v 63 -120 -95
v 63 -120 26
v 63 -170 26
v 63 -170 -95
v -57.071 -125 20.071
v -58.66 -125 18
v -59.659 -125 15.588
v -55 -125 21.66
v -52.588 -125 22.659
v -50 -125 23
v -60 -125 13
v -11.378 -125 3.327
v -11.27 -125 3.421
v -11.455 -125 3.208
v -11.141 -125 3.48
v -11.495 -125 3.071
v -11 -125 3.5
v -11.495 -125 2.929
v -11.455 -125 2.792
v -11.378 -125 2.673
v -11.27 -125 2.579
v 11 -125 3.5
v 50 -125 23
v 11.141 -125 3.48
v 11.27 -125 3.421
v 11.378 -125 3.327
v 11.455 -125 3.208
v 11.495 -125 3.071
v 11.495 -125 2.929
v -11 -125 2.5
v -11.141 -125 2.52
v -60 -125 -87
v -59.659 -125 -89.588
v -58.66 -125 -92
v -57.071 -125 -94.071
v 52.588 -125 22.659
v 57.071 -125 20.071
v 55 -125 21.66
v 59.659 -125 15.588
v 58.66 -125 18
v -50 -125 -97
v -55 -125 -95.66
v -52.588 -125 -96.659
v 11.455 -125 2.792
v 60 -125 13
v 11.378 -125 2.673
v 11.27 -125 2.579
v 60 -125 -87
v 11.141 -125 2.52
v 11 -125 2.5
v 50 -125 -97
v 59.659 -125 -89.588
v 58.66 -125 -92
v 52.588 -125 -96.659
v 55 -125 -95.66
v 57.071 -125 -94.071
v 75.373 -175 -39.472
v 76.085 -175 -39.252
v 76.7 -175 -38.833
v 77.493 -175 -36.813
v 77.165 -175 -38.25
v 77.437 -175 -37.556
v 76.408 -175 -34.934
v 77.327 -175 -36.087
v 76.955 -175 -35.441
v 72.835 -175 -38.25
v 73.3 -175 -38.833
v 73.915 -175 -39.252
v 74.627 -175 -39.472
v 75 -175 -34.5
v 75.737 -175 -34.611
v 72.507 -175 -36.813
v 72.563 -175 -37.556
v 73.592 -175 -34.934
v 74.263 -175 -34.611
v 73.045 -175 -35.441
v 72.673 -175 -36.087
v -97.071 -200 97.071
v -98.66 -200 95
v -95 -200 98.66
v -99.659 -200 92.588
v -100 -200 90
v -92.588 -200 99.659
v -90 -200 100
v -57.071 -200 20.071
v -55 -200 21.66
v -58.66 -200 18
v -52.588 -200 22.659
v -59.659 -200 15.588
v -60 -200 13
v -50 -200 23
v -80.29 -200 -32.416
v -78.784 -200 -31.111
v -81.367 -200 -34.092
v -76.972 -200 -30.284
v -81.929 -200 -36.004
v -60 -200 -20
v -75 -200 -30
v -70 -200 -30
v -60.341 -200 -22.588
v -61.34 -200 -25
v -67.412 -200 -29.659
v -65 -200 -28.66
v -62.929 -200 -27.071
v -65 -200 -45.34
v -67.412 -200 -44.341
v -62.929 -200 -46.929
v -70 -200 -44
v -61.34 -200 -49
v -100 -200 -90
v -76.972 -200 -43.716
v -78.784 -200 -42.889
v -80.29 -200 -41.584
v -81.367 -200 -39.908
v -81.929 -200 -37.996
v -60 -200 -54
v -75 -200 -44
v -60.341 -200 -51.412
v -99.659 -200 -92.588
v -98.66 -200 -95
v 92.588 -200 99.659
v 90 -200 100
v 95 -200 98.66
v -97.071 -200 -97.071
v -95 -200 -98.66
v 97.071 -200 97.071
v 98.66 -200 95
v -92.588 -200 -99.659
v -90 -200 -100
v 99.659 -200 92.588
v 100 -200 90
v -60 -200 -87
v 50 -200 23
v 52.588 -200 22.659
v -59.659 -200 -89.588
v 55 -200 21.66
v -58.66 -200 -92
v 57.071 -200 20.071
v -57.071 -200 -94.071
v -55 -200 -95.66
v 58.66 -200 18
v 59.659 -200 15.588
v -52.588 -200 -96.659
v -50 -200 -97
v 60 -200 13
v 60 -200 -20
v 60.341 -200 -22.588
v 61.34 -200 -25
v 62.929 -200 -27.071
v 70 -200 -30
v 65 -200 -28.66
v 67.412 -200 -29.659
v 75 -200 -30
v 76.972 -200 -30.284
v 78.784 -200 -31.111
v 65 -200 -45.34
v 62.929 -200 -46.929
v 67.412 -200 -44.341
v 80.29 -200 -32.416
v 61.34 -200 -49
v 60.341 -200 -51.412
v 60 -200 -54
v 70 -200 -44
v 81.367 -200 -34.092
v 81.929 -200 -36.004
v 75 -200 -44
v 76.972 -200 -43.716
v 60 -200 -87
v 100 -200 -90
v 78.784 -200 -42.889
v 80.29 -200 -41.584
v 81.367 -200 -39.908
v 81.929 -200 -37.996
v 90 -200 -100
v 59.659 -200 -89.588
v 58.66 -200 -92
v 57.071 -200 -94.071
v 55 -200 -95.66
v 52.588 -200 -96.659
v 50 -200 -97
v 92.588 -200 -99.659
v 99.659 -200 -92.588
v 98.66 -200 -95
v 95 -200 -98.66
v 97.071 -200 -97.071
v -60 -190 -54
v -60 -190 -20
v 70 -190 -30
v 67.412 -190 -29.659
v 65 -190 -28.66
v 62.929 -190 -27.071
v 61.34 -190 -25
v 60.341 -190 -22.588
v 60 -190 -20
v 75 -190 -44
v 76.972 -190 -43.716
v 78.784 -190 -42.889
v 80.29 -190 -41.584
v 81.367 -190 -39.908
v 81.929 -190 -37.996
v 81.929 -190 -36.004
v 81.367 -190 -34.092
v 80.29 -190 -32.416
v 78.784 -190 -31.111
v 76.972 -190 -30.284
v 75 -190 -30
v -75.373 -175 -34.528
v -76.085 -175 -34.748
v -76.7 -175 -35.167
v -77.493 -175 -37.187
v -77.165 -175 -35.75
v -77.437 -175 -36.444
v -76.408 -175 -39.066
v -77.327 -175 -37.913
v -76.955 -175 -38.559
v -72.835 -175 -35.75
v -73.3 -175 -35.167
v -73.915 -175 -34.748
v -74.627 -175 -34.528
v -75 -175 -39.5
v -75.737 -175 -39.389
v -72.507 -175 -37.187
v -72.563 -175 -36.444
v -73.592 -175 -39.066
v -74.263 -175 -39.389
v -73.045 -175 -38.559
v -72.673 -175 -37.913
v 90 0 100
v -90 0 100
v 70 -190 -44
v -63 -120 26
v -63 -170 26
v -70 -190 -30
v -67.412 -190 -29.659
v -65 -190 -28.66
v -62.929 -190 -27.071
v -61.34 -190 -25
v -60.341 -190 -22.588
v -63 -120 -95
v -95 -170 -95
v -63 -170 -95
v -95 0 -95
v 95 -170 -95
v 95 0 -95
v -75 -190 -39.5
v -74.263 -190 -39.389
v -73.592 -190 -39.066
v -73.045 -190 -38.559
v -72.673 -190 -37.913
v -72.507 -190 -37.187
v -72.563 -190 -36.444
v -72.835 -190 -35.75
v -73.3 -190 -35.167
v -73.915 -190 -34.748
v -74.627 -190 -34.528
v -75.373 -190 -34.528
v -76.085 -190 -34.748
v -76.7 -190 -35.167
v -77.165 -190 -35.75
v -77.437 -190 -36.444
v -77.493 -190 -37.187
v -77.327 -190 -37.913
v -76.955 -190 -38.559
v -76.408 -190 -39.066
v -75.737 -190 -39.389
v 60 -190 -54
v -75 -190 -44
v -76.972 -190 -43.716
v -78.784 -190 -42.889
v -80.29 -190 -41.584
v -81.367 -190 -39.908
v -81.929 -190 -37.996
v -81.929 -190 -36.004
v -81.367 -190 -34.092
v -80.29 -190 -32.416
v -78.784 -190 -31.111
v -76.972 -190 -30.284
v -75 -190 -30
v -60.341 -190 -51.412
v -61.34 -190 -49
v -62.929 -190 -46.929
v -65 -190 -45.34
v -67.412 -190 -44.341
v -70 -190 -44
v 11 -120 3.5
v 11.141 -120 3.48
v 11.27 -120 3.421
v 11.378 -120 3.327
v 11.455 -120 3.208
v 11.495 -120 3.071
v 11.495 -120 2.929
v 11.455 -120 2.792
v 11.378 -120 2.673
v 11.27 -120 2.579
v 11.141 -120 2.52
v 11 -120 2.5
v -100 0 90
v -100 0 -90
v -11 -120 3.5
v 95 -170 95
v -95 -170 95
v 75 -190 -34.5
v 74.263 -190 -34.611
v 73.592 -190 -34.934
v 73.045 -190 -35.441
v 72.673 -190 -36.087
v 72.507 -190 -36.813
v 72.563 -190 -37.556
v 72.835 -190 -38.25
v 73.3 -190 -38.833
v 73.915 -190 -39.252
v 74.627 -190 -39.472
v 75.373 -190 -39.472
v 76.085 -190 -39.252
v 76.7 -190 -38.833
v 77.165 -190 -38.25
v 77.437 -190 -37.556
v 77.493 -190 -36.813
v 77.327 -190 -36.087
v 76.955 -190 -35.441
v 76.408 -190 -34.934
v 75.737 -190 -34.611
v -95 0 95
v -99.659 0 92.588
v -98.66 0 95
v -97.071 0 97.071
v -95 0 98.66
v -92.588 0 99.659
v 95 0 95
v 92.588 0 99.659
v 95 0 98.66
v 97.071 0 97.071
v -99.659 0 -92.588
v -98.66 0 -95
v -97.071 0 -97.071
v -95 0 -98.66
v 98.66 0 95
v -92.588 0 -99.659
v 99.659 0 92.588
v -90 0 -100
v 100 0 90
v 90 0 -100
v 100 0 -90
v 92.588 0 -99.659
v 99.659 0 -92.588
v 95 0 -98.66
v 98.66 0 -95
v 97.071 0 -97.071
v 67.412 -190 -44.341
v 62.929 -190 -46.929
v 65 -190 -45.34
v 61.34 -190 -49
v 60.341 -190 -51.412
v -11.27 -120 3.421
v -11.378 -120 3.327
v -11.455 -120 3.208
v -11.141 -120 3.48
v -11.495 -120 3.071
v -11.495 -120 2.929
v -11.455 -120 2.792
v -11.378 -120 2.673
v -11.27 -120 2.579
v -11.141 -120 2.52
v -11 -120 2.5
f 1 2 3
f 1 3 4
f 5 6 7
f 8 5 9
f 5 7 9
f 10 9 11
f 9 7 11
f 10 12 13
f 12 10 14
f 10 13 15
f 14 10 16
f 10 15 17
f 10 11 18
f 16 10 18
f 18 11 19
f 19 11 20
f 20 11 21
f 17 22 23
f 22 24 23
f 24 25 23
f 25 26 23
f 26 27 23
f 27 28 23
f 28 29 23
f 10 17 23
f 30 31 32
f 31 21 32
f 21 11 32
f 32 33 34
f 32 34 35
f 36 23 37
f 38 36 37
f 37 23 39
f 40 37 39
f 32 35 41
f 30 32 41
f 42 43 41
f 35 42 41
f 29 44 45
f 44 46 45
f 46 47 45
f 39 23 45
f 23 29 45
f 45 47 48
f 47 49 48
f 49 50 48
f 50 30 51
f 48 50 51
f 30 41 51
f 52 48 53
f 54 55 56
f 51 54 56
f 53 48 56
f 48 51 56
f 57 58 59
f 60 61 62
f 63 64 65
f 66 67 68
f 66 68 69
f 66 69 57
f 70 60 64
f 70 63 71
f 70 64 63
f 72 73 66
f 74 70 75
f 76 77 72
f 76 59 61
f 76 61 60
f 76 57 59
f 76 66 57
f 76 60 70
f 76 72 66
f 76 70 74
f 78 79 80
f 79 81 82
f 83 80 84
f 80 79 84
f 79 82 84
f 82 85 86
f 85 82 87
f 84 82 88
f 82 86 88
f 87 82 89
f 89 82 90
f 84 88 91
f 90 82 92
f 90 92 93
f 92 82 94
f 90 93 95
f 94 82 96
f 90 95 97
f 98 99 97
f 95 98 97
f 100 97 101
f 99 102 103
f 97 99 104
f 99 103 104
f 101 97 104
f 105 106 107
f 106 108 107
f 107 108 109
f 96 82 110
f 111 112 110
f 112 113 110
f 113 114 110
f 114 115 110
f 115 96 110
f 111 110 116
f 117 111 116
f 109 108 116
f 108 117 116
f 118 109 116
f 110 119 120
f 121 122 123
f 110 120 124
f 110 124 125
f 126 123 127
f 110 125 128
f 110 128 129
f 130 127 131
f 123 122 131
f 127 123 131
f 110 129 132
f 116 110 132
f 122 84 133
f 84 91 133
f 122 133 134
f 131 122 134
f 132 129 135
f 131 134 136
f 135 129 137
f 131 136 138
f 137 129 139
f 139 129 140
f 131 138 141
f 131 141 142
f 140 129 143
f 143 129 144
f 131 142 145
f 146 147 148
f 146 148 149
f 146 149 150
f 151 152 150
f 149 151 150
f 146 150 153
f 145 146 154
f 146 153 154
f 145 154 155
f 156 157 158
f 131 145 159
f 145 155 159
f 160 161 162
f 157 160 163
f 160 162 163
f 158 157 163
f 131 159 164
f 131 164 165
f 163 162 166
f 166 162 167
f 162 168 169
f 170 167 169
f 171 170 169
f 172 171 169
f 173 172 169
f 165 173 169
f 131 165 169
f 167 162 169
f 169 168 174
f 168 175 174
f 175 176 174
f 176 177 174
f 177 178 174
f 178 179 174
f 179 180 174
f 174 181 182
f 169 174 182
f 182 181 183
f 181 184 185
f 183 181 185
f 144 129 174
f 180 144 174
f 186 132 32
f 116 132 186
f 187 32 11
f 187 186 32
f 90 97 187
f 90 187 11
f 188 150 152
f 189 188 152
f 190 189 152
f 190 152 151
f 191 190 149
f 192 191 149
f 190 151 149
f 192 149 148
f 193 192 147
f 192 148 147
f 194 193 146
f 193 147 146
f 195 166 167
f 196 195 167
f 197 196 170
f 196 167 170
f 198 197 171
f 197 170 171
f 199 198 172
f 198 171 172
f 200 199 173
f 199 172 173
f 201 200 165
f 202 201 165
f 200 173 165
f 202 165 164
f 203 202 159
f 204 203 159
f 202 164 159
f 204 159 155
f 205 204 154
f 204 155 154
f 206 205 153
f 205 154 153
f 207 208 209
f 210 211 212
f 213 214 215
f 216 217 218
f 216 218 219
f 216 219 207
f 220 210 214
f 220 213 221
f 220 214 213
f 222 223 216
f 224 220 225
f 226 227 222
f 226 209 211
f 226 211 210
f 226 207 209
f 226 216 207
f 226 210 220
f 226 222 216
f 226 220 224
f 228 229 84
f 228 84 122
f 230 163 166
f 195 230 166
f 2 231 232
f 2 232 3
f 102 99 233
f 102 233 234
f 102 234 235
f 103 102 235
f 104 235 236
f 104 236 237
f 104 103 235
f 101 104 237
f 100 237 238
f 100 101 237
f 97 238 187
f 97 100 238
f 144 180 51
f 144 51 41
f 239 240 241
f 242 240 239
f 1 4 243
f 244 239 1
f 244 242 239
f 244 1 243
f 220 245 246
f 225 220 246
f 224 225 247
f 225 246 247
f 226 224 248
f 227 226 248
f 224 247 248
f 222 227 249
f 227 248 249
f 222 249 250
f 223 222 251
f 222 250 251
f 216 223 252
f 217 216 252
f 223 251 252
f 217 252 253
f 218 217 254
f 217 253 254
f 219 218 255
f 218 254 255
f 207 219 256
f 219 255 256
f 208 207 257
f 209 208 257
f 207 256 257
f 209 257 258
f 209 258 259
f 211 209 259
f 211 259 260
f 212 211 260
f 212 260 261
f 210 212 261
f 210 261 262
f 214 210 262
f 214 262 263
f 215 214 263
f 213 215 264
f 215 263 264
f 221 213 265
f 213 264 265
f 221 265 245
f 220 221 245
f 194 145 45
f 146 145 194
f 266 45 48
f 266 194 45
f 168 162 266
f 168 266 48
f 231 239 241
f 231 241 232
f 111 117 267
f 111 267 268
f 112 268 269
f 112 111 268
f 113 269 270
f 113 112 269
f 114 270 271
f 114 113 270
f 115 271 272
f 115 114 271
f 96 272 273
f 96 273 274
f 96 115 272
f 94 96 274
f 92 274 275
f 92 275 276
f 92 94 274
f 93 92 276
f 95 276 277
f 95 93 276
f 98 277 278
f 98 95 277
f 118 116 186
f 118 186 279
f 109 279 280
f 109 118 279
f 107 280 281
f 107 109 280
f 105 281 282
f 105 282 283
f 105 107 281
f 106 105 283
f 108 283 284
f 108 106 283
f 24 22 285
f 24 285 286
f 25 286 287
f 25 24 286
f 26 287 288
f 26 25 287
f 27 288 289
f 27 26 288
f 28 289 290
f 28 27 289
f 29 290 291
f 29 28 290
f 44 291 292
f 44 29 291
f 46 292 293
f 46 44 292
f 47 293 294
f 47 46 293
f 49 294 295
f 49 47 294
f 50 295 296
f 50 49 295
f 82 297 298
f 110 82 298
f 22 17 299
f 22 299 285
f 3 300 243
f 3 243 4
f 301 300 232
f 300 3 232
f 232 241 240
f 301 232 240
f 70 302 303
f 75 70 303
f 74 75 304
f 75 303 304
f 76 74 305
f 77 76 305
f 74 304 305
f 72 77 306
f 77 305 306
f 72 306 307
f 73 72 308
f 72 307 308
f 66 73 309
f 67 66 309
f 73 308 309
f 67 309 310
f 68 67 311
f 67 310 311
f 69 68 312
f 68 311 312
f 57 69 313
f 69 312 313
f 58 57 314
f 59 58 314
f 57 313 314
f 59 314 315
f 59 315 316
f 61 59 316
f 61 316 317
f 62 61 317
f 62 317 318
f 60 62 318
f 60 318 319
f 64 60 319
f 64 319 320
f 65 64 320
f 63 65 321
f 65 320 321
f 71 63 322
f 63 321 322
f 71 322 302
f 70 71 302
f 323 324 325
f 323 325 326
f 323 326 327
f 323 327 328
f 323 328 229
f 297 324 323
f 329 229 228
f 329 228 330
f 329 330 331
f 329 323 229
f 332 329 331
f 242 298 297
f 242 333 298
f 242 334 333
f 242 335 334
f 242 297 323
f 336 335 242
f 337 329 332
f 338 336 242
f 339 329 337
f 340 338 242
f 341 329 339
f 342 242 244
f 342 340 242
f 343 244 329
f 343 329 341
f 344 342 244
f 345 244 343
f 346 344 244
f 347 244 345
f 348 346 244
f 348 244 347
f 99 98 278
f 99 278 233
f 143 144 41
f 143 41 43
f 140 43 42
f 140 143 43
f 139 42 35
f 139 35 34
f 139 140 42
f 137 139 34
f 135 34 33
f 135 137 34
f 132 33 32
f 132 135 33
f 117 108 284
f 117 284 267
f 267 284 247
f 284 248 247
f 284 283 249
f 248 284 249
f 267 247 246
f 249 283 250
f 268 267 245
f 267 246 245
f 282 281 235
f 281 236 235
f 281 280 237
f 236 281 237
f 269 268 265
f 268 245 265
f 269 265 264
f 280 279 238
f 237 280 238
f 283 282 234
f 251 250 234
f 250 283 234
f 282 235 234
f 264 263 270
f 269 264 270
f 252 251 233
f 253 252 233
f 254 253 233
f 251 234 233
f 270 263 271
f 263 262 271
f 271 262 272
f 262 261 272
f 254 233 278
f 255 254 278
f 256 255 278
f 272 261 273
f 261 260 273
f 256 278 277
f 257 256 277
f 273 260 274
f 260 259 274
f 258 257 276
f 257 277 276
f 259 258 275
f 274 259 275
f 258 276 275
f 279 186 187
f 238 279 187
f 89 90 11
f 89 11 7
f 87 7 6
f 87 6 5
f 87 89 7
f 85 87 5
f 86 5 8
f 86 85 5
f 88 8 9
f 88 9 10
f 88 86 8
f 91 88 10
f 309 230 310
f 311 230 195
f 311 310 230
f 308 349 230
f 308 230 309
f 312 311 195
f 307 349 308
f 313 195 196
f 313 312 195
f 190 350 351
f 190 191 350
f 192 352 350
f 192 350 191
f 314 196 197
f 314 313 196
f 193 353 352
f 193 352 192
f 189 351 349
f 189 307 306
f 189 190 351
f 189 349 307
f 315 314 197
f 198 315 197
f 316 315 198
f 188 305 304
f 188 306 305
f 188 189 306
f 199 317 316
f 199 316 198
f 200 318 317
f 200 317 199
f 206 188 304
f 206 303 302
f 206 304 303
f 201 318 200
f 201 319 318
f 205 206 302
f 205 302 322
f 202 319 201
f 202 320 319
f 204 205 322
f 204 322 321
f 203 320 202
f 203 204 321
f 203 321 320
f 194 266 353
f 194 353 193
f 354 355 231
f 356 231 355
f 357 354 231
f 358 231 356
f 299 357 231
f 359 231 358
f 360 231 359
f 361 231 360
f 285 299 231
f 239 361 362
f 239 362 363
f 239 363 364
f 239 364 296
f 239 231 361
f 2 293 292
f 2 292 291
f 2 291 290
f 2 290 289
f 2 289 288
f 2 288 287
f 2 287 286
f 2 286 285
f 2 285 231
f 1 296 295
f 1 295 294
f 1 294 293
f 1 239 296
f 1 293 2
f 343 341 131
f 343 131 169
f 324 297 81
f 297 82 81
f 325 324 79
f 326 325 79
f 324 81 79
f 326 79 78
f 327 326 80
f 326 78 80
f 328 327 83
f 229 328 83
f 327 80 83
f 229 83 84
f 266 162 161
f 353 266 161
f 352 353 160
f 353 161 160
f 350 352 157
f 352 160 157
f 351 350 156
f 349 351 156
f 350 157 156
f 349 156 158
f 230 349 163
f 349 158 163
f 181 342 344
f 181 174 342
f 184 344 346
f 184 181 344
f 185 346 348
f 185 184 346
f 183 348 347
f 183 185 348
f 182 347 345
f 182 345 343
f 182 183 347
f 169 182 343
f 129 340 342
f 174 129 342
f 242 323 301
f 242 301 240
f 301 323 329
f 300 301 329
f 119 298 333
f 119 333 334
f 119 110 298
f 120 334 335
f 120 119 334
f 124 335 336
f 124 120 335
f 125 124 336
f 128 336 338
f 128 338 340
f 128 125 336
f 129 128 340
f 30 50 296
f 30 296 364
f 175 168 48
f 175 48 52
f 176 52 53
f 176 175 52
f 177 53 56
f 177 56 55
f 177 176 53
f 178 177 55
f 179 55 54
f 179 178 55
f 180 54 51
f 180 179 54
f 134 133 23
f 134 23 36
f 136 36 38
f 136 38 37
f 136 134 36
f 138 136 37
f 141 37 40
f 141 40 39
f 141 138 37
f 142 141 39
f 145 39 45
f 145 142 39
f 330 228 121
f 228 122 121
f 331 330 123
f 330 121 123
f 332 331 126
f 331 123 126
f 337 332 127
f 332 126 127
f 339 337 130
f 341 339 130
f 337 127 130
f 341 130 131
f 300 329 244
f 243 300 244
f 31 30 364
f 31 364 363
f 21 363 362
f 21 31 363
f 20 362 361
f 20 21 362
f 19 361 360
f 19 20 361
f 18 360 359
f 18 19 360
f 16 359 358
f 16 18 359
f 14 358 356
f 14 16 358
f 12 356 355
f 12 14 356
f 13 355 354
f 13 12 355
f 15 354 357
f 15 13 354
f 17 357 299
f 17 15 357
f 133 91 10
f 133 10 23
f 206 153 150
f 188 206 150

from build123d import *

# Parameters (mm, degrees)
SKETCH1_W             = 200
SKETCH1_H             = 200
BOSS_EXTRUDE1_DEPTH   = 200
SKETCH2_W             = 190
SKETCH2_H             = 190
CUT_EXTRUDE1_DEPTH    = 120
CUT_EXTRUDE2_DEPTH    = 75
CUT_EXTRUDE3_DEPTH    = 320
CUT_EXTRUDE4_DEPTH    = 50
CUT_EXTRUDE5_DEPTH    = 10
CROQUIS1_R            = 2.5
CORTAR_EXTRUIR1_DEPTH = 15
REDONDEO1_R           = 10


with BuildPart() as part:
    # Sketch1 → Boss-Extrude1 (new body)
    with BuildSketch(Plane(origin=(0, 0, 0), x_dir=(1, 0, 0), z_dir=(0, 1, 0))):
        Rectangle(SKETCH1_W, SKETCH1_H)
    extrude(amount=-BOSS_EXTRUDE1_DEPTH)

    # Sketch2 → Cut-Extrude1 (cut)
    with BuildSketch(Plane(origin=(0, 0, 0), x_dir=(1, 0, 0), z_dir=(0, 1, 0))):
        Rectangle(SKETCH2_W, SKETCH2_H)
    extrude(amount=-CUT_EXTRUDE1_DEPTH, mode=Mode.SUBTRACT)

    # Sketch3 → Cut-Extrude2 (cut)
    with BuildSketch(Plane(origin=(0, -200, 0), x_dir=(-1, 0, 0), z_dir=(0, -1, 0))):
        with BuildLine():
            Line((-60, 18.105219257), (-60, 87))
            ThreePointArc((-60, 87), (-57.071067812, 94.071067812), (-50, 97))
            Line((-50, 97), (50, 97))
            ThreePointArc((50, 97), (57.071067812, 94.071067812), (60, 87))
            Line((60, 87), (60, 18.105219257))
            Line((60, 18.105219257), (60, -13))
            ThreePointArc((60, -13), (57.071067812, -20.071067812), (50, -23))
            Line((50, -23), (-50, -23))
            ThreePointArc((-50, -23), (-57.071067812, -20.071067812), (-60, -13))
            Line((-60, -13), (-60, 18.105219257))
        make_face()
    extrude(amount=-CUT_EXTRUDE2_DEPTH, mode=Mode.SUBTRACT)

    # Sketch4 → Cut-Extrude3 (cut)
    with BuildSketch(Plane(origin=(0, -125, 0), x_dir=(-1, 0, 0), z_dir=(0, -1, 0))):
        with BuildLine():
            Line((11, -3.5), (-11, -3.5))
            ThreePointArc((-11, -3.5), (-11.5, -3), (-11, -2.5))
            Line((-11, -2.5), (11, -2.5))
            ThreePointArc((11, -2.5), (11.5, -3), (11, -3.5))
        make_face()
    extrude(amount=-CUT_EXTRUDE3_DEPTH, mode=Mode.SUBTRACT)

    # Sketch5 → Cut-Extrude4 (cut)
    with BuildSketch(Plane(origin=(0, -120, 0), x_dir=(1, 0, 0), z_dir=(0, 1, 0))):
        Polygon((-63, 95), (-63, -26), (63, -26), (63, 95), (95, 95), (95, -95), (-95, -95), (-95, 95), align=None)
    extrude(amount=-CUT_EXTRUDE4_DEPTH, mode=Mode.SUBTRACT)

    # Sketch6 → Cut-Extrude5 (cut)
    with BuildSketch(Plane.XZ.offset(200)):
        with BuildLine():
            Line((-70, -44), (-75, -44))
            ThreePointArc((-75, -44), (-82, -37), (-75, -30))
            Line((-75, -30), (-70, -30))
            ThreePointArc((-70, -30), (-62.928932188, -27.071067812), (-60, -20))
            Line((-60, -20), (-60, -54))
            ThreePointArc((-60, -54), (-62.928932188, -46.928932188), (-70, -44))
        make_face()
        with BuildLine():
            Line((70, -44), (75, -44))
            ThreePointArc((75, -44), (82, -37), (75, -30))
            Line((75, -30), (70, -30))
            ThreePointArc((70, -30), (62.928932188, -27.071067812), (60, -20))
            Line((60, -20), (60, -54))
            ThreePointArc((60, -54), (62.928932188, -46.928932188), (70, -44))
        make_face()
    extrude(amount=-CUT_EXTRUDE5_DEPTH, mode=Mode.SUBTRACT)

    # Croquis1 → Cortar-Extruir1 (cut)
    with BuildSketch(Plane.XZ.offset(190)):
        with Locations(Location((-75, -37, 0), (0, 0, 270))):
            Circle(CROQUIS1_R)
        with Locations(Location((75, -37, 0), (0, 0, 90))):
            Circle(CROQUIS1_R)
    extrude(amount=-CORTAR_EXTRUIR1_DEPTH, mode=Mode.SUBTRACT)

    # Redondeo1
    redondeo1_edges = [part.edges().sort_by_distance(p)[0] for p in [
        (100, -100, 100),
        (-100, -100, 100),
        (-100, -100, -100),
        (100, -100, -100),
    ]]
    fillet(redondeo1_edges, radius=REDONDEO1_R)


solid = part.part
